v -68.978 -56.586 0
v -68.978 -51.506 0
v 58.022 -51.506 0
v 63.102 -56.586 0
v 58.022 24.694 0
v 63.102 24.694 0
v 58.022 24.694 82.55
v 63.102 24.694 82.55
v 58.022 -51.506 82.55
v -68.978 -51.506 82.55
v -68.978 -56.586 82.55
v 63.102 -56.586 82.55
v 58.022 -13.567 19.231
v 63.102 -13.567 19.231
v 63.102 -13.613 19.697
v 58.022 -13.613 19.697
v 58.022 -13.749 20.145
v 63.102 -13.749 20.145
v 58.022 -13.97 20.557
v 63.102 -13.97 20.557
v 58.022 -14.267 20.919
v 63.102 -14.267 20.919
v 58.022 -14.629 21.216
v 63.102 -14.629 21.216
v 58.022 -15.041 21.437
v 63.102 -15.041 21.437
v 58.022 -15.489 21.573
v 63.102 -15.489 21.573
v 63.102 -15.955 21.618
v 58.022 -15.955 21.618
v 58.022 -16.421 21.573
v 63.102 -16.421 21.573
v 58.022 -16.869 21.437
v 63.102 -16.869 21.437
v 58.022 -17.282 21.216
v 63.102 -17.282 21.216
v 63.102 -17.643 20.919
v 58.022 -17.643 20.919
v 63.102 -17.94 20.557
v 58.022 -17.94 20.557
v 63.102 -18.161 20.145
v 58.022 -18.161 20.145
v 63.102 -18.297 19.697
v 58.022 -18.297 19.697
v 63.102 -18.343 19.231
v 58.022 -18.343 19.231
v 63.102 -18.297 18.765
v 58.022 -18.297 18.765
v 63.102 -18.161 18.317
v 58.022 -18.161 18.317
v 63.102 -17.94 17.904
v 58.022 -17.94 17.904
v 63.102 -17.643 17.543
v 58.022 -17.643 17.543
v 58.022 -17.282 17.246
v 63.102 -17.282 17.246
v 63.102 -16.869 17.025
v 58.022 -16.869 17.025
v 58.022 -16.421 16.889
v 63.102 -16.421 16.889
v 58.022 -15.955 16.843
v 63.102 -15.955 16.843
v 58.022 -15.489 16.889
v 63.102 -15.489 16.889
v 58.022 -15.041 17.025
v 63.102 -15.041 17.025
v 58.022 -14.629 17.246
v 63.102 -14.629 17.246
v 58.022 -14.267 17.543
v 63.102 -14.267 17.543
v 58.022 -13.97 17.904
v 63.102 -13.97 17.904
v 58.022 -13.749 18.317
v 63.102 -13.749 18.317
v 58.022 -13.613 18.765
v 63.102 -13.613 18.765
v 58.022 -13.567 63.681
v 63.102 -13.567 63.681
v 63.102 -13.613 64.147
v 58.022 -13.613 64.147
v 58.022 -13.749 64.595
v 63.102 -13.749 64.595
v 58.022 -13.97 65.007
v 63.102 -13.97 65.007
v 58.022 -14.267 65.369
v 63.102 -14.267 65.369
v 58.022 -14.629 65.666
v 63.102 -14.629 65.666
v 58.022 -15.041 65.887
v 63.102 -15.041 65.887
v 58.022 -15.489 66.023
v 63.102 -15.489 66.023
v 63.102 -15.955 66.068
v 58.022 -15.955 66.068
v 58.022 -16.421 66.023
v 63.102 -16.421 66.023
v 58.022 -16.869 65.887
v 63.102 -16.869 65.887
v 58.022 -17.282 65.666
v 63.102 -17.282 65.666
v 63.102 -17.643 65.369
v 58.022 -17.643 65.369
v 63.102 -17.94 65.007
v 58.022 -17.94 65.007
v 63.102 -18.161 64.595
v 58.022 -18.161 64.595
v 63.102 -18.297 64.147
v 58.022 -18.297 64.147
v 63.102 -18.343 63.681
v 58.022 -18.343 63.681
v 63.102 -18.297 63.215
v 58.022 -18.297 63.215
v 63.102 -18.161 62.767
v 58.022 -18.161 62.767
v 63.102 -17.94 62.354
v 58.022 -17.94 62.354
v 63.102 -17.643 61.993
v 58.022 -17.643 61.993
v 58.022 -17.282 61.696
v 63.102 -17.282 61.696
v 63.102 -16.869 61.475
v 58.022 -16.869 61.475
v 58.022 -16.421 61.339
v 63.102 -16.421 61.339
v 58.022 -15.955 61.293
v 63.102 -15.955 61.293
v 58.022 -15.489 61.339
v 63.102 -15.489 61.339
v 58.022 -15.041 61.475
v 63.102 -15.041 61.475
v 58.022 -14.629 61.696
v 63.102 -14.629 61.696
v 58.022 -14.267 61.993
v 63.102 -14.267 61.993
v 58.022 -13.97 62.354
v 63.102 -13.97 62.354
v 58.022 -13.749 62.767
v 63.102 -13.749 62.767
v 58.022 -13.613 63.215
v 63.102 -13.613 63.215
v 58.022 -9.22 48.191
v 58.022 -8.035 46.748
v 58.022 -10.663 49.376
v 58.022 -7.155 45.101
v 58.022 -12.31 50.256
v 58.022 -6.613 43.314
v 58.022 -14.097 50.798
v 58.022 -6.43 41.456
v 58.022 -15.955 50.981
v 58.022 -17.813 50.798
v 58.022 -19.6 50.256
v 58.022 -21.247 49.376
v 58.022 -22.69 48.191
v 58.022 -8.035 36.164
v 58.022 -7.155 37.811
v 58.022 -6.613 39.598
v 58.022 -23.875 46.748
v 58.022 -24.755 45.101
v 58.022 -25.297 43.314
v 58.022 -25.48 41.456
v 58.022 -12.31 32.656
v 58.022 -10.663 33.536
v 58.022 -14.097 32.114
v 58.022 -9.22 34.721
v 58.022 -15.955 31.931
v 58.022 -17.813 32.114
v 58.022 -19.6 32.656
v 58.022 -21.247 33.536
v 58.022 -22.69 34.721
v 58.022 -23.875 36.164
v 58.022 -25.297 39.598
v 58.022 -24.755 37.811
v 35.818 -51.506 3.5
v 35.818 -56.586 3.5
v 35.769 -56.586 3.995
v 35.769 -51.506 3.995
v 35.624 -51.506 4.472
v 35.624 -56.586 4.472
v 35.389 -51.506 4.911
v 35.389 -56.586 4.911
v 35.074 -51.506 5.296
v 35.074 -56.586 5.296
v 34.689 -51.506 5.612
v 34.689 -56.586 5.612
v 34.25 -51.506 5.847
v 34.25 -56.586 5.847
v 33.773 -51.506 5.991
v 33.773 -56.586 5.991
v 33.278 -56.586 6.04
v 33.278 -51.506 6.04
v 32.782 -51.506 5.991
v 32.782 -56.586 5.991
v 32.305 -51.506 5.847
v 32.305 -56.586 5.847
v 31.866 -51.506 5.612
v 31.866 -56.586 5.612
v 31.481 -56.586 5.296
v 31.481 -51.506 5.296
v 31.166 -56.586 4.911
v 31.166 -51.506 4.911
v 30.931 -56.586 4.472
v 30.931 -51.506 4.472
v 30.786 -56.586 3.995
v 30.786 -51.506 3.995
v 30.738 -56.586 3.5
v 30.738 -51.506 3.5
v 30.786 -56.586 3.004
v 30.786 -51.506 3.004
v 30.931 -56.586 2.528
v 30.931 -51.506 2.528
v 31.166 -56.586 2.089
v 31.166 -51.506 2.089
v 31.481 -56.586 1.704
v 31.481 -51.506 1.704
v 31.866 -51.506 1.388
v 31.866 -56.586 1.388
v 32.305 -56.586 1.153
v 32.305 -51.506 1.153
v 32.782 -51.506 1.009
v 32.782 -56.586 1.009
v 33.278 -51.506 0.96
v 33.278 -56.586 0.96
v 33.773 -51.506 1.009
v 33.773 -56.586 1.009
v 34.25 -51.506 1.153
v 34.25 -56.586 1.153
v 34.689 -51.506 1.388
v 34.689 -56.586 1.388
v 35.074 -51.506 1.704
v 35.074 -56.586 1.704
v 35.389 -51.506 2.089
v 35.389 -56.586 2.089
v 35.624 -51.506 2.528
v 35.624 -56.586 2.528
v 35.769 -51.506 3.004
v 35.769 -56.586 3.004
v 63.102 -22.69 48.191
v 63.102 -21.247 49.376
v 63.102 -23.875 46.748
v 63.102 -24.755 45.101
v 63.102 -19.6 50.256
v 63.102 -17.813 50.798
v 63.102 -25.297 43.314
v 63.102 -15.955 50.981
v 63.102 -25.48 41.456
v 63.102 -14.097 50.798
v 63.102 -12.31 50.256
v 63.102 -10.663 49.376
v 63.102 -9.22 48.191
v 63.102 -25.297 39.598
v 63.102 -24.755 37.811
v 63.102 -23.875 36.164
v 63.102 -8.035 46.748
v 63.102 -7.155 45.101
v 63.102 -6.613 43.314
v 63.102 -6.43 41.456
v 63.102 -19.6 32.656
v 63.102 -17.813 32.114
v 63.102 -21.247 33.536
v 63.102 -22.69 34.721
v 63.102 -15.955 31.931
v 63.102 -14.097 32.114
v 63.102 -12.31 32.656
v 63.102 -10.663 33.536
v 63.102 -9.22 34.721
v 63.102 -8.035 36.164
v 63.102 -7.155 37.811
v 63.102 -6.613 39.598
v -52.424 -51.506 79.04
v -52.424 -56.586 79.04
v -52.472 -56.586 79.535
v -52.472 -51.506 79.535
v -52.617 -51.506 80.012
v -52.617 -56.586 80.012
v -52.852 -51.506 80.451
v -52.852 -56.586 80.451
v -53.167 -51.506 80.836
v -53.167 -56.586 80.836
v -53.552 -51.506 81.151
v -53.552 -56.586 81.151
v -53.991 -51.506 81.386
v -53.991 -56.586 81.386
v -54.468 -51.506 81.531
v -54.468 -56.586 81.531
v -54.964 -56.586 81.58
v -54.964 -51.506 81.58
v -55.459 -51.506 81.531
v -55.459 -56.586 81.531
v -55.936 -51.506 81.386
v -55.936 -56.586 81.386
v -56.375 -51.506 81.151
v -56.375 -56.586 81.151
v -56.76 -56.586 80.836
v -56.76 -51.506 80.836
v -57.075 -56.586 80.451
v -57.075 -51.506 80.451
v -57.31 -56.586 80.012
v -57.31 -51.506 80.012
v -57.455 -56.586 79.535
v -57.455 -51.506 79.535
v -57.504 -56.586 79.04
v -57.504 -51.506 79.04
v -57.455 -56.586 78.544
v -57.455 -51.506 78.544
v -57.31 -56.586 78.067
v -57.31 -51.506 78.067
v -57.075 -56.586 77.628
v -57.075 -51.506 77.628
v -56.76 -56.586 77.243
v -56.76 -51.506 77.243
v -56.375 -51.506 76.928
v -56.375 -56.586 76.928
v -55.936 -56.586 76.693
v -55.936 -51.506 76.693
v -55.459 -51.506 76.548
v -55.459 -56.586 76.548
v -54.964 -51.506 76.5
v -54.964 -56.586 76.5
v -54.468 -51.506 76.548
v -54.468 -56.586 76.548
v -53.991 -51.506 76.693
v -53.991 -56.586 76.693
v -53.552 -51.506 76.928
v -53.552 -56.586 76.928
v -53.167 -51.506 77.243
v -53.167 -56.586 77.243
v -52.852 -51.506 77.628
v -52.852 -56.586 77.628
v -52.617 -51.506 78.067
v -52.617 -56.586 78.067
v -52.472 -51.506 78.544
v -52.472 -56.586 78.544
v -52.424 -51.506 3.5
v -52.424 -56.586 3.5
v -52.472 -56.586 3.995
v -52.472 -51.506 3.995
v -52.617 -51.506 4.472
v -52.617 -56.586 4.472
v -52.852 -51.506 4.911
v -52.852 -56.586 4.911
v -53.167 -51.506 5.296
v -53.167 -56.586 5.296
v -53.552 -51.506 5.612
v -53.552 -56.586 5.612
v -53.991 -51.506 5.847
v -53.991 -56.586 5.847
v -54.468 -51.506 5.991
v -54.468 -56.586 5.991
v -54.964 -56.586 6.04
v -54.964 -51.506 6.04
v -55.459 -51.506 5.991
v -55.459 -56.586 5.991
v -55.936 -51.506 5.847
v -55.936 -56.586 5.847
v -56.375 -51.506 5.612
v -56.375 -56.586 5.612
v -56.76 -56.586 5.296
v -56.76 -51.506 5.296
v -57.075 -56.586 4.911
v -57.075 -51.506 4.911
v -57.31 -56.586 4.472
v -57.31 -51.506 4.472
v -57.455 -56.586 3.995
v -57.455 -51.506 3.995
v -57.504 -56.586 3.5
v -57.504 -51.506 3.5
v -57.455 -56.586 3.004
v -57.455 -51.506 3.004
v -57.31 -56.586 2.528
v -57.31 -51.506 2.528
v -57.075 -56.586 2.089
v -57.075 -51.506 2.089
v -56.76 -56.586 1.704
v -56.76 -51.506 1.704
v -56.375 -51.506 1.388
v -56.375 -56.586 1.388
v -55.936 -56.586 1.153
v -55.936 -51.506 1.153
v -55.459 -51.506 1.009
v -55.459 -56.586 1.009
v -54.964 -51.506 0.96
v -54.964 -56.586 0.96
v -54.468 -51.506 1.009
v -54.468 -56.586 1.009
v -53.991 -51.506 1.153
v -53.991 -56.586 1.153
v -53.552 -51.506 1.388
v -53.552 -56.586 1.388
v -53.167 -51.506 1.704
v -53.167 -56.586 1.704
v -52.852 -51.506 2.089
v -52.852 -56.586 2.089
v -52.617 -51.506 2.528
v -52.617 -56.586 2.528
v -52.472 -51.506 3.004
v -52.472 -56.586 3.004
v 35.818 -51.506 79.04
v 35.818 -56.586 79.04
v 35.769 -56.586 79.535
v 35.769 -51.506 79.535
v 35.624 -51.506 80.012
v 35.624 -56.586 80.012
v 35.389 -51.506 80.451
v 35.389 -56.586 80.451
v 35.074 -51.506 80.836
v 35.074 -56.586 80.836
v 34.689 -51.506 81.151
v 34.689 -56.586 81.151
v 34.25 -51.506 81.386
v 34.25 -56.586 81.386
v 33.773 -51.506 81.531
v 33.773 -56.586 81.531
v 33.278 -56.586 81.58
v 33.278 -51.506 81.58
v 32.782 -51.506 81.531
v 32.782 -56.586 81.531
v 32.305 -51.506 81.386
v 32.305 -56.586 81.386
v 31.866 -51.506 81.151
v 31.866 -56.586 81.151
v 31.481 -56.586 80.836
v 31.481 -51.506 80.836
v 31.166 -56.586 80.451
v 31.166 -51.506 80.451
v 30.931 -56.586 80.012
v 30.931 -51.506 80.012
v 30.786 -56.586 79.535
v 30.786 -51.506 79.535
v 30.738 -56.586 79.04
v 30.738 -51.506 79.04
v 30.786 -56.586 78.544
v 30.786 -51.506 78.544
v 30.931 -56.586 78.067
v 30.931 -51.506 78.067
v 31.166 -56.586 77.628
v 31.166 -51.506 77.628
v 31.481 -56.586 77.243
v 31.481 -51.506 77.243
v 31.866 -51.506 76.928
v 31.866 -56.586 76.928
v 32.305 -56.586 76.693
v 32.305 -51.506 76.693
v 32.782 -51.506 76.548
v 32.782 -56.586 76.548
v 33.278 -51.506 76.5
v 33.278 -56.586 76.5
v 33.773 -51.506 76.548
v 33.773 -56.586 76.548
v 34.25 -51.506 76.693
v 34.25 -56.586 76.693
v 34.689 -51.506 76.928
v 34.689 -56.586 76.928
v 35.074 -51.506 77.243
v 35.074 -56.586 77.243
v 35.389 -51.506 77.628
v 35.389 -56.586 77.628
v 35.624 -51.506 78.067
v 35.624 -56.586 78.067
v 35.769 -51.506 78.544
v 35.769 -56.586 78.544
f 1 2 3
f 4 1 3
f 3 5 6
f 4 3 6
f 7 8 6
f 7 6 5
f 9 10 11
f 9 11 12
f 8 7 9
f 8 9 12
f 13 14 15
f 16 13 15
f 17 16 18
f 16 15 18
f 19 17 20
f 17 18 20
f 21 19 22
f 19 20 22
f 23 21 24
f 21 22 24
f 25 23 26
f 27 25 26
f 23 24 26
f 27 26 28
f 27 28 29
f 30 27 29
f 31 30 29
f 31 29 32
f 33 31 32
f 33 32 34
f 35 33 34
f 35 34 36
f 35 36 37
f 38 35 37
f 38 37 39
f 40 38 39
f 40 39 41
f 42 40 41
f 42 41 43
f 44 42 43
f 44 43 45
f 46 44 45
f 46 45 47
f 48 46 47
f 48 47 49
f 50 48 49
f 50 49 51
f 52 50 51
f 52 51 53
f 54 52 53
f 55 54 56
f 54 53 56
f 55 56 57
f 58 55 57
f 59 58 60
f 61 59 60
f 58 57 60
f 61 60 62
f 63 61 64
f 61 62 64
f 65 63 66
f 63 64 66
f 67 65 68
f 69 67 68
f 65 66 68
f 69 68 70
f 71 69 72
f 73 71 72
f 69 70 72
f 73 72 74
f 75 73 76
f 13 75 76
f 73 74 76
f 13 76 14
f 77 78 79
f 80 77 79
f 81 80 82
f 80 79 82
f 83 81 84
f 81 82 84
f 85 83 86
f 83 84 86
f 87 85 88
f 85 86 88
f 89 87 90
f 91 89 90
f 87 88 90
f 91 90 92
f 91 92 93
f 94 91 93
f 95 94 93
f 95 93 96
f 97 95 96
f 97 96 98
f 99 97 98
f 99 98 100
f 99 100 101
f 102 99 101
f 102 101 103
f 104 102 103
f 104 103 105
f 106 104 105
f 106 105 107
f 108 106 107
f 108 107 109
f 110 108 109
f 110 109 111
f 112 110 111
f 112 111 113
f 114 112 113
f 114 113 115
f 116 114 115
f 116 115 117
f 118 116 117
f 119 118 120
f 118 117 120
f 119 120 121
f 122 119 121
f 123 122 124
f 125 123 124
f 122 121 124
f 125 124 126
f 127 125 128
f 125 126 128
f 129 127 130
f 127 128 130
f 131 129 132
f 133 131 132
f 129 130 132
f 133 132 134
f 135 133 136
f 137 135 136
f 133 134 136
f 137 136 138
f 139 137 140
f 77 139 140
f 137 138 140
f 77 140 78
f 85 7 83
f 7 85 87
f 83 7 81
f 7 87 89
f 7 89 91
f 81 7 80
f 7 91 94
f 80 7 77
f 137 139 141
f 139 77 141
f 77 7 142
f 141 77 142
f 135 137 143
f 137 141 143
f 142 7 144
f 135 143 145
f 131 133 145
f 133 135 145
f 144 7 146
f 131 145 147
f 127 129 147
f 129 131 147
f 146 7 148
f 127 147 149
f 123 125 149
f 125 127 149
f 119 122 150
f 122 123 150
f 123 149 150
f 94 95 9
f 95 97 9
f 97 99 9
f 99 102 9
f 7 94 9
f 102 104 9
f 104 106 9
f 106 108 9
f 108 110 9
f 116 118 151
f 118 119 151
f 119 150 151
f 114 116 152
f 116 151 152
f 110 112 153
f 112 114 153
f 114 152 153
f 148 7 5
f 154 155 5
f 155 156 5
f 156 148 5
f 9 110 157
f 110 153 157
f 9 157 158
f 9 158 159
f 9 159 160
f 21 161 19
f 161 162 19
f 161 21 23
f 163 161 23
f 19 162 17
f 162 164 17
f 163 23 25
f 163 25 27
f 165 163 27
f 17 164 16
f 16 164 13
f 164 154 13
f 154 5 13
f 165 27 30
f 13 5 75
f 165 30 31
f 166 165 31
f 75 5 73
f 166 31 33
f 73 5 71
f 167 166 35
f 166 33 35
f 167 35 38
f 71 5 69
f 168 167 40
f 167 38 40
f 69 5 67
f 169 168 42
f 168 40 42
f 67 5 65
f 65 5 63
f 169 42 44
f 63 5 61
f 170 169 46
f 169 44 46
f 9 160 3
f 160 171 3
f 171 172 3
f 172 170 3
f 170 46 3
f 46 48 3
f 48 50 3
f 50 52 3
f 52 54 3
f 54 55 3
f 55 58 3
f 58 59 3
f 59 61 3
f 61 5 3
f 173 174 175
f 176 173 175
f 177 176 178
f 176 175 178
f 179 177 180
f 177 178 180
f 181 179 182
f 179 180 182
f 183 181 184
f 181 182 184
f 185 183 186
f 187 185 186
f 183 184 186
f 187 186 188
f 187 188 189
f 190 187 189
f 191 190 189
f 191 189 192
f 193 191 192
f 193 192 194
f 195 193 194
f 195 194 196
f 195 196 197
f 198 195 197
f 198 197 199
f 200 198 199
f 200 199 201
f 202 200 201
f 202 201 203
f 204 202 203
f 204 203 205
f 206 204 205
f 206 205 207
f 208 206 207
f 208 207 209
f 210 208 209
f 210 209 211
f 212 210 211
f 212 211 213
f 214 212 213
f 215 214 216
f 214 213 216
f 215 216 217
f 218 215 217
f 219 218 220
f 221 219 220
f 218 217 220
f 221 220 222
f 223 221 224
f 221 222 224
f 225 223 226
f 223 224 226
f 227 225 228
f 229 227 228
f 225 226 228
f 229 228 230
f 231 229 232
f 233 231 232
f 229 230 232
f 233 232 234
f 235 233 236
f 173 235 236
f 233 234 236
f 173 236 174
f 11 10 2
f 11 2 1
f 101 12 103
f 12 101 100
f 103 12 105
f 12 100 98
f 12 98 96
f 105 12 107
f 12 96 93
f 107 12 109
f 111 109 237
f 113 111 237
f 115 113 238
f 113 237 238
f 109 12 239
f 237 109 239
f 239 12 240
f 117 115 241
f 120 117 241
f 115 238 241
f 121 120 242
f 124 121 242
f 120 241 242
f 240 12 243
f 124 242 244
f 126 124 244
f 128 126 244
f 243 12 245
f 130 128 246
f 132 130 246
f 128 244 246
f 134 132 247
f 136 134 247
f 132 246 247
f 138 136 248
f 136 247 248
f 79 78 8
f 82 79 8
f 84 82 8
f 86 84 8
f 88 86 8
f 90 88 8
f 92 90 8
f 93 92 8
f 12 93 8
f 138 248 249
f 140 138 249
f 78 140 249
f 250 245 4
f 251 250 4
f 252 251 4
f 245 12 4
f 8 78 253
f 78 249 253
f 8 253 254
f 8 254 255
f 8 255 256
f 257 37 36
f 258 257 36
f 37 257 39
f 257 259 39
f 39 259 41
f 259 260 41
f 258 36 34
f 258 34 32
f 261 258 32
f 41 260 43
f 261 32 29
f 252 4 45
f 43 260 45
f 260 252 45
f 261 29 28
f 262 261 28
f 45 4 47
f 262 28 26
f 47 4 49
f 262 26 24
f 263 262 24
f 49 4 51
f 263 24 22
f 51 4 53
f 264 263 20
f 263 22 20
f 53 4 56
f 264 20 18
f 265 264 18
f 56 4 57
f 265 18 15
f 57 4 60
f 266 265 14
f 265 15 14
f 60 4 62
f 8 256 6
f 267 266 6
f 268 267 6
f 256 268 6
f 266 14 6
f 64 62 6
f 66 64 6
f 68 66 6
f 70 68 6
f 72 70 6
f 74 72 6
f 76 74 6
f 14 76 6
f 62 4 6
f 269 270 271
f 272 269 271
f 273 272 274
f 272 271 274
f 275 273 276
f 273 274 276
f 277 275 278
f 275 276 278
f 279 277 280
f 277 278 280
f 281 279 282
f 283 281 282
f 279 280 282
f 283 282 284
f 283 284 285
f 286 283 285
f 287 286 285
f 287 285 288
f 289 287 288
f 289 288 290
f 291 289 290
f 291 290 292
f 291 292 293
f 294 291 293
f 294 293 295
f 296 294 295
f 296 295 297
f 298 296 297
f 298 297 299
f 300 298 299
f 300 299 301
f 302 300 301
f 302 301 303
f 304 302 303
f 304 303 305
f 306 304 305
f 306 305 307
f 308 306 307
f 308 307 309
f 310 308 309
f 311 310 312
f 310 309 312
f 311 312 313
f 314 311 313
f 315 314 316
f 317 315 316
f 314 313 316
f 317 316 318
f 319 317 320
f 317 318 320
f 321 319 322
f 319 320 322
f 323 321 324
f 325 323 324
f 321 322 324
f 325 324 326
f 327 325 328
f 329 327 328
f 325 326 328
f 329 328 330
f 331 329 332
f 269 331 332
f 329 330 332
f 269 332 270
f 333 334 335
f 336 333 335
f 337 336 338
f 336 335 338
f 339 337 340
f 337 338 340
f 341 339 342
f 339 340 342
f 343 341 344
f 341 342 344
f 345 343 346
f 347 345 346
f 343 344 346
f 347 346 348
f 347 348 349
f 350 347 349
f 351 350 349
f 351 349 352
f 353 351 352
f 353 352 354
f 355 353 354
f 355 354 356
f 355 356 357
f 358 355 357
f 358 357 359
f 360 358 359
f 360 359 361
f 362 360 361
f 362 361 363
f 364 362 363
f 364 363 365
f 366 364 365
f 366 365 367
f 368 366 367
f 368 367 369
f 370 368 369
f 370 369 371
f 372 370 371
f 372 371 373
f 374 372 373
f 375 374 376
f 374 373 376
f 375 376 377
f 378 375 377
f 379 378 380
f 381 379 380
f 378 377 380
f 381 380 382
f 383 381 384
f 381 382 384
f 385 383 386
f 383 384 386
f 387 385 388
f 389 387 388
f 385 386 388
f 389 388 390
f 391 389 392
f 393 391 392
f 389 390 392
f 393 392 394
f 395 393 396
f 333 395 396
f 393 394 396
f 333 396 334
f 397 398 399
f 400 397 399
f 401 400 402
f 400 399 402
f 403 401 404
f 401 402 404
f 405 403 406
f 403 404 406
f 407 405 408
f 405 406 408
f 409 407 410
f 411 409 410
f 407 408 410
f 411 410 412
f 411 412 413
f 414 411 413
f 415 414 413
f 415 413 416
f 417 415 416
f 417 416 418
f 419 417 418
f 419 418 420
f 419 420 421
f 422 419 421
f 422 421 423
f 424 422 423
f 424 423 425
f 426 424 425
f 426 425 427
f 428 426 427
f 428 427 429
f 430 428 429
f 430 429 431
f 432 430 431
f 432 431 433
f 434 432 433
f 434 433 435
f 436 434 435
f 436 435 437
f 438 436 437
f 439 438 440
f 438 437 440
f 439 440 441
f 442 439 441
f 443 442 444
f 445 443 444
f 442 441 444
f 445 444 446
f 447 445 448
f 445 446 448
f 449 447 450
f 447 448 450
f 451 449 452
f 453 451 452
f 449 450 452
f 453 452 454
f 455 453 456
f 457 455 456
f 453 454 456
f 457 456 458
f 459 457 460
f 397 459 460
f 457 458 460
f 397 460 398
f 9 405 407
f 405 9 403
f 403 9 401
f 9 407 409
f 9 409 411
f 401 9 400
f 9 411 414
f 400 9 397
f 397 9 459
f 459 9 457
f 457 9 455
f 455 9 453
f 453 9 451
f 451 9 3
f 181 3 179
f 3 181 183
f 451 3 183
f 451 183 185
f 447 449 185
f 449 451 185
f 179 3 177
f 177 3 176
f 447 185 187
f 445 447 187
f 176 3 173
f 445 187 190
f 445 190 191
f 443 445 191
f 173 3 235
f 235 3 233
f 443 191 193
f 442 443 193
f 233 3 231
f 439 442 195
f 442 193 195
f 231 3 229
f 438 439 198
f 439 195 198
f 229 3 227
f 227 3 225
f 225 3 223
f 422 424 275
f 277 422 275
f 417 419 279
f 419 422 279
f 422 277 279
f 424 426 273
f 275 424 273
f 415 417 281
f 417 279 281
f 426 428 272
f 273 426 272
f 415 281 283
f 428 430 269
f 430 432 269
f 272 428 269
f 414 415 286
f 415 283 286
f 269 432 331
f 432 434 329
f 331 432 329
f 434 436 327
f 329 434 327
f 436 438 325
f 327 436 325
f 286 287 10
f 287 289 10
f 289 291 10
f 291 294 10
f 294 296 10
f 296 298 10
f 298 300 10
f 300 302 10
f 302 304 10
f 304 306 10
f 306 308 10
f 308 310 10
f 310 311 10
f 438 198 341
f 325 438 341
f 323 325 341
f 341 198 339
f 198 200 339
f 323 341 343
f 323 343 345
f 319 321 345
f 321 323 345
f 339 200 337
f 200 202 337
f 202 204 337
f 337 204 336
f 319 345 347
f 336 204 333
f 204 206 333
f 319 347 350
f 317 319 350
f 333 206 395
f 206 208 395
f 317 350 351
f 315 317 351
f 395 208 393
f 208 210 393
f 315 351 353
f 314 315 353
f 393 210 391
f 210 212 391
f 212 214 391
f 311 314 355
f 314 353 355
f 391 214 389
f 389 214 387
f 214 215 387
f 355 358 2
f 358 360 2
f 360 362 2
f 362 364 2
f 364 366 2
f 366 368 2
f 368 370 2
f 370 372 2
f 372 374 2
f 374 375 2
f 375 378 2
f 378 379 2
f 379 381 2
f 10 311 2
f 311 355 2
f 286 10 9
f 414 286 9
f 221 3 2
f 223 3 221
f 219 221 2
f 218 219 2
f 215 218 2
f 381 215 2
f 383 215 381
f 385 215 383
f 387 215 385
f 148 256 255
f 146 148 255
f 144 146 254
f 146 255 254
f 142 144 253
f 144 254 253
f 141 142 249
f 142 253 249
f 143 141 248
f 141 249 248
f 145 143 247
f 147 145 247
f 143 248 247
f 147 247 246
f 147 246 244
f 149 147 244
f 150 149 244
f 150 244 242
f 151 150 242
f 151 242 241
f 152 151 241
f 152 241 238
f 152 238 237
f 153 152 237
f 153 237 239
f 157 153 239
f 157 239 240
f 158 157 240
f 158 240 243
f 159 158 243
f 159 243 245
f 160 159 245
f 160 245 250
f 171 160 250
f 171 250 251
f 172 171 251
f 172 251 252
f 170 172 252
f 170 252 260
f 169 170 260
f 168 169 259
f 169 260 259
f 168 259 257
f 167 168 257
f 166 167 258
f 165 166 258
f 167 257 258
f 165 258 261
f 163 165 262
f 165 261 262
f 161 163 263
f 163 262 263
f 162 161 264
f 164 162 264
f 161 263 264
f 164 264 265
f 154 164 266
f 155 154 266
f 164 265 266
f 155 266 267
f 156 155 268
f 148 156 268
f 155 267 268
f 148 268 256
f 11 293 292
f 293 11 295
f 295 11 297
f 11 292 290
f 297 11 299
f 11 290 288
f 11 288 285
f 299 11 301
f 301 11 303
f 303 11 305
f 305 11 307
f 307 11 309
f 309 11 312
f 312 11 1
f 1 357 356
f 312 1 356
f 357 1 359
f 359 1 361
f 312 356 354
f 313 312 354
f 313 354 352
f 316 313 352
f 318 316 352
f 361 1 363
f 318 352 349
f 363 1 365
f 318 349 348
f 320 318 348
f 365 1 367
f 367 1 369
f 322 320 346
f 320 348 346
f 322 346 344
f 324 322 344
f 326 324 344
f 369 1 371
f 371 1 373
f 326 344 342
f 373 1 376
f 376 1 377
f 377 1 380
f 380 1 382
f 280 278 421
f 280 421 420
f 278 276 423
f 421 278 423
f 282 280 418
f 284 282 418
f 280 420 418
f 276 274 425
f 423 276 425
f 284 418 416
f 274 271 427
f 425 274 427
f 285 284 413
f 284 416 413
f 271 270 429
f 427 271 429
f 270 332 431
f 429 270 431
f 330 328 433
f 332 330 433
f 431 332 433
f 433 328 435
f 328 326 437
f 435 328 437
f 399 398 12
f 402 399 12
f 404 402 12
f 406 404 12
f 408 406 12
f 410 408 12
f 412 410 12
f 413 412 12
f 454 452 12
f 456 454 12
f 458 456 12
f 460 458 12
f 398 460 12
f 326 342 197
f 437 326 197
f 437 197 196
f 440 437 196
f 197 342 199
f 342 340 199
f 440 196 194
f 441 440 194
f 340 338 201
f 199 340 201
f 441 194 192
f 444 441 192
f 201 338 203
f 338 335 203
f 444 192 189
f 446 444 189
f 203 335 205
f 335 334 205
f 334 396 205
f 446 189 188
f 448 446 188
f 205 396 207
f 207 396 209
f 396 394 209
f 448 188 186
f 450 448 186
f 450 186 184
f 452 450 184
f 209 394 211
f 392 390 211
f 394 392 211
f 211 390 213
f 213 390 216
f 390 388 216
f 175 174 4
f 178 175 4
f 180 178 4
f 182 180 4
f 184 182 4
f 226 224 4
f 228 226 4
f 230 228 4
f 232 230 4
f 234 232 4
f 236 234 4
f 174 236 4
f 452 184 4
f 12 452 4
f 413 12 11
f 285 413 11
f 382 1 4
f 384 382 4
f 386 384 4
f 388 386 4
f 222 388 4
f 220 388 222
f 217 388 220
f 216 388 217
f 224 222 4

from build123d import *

# Parameters (mm, degrees)
F1_DEPTH = 82.55
F3_D     = 19.05
F4_D     = 4.7752
F5_D     = 4.7752
F7_D     = 5.08


with BuildPart() as f1:
    # F0 (on Top) → F1 (new body)
    with BuildSketch(Plane.XY):
        Polygon((58.022249, -51.505502), (-68.977751, -51.505502), (-68.977751, -56.585502), (63.102249, -56.585502), (63.102249, 24.694498), (58.022249, 24.694498), align=None)
    extrude(amount=F1_DEPTH)

    # F3 (through all)
    with Locations(Plane(origin=(58.022249, 0, 0), x_dir=(0, -1, 0), z_dir=(-1, 0, 0))):
        with Locations((15.955091, 41.455898)):
            Hole(F3_D / 2)

    # F4 (through all)
    with Locations(Plane(origin=(58.022249, 0, 0), x_dir=(0, -1, 0), z_dir=(-1, 0, 0))):
        with Locations((15.955091, 63.680898)):
            Hole(F4_D / 2)

    # F5 (through all)
    with Locations(Plane(origin=(58.022249, 0, 0), x_dir=(0, -1, 0), z_dir=(-1, 0, 0))):
        with Locations((15.955091, 19.230898)):
            Hole(F5_D / 2)

    # F7 (through all)
    with Locations(Plane(origin=(0, -51.505502, 0), x_dir=(-1, 0, 0), z_dir=(0, 1, 0))):
        with Locations((-33.277512, 79.039508), (54.963514, 79.039508), (54.963514, 3.499908), (-33.277512, 3.499908)):
            Hole(F7_D / 2)


solid = f1.part
